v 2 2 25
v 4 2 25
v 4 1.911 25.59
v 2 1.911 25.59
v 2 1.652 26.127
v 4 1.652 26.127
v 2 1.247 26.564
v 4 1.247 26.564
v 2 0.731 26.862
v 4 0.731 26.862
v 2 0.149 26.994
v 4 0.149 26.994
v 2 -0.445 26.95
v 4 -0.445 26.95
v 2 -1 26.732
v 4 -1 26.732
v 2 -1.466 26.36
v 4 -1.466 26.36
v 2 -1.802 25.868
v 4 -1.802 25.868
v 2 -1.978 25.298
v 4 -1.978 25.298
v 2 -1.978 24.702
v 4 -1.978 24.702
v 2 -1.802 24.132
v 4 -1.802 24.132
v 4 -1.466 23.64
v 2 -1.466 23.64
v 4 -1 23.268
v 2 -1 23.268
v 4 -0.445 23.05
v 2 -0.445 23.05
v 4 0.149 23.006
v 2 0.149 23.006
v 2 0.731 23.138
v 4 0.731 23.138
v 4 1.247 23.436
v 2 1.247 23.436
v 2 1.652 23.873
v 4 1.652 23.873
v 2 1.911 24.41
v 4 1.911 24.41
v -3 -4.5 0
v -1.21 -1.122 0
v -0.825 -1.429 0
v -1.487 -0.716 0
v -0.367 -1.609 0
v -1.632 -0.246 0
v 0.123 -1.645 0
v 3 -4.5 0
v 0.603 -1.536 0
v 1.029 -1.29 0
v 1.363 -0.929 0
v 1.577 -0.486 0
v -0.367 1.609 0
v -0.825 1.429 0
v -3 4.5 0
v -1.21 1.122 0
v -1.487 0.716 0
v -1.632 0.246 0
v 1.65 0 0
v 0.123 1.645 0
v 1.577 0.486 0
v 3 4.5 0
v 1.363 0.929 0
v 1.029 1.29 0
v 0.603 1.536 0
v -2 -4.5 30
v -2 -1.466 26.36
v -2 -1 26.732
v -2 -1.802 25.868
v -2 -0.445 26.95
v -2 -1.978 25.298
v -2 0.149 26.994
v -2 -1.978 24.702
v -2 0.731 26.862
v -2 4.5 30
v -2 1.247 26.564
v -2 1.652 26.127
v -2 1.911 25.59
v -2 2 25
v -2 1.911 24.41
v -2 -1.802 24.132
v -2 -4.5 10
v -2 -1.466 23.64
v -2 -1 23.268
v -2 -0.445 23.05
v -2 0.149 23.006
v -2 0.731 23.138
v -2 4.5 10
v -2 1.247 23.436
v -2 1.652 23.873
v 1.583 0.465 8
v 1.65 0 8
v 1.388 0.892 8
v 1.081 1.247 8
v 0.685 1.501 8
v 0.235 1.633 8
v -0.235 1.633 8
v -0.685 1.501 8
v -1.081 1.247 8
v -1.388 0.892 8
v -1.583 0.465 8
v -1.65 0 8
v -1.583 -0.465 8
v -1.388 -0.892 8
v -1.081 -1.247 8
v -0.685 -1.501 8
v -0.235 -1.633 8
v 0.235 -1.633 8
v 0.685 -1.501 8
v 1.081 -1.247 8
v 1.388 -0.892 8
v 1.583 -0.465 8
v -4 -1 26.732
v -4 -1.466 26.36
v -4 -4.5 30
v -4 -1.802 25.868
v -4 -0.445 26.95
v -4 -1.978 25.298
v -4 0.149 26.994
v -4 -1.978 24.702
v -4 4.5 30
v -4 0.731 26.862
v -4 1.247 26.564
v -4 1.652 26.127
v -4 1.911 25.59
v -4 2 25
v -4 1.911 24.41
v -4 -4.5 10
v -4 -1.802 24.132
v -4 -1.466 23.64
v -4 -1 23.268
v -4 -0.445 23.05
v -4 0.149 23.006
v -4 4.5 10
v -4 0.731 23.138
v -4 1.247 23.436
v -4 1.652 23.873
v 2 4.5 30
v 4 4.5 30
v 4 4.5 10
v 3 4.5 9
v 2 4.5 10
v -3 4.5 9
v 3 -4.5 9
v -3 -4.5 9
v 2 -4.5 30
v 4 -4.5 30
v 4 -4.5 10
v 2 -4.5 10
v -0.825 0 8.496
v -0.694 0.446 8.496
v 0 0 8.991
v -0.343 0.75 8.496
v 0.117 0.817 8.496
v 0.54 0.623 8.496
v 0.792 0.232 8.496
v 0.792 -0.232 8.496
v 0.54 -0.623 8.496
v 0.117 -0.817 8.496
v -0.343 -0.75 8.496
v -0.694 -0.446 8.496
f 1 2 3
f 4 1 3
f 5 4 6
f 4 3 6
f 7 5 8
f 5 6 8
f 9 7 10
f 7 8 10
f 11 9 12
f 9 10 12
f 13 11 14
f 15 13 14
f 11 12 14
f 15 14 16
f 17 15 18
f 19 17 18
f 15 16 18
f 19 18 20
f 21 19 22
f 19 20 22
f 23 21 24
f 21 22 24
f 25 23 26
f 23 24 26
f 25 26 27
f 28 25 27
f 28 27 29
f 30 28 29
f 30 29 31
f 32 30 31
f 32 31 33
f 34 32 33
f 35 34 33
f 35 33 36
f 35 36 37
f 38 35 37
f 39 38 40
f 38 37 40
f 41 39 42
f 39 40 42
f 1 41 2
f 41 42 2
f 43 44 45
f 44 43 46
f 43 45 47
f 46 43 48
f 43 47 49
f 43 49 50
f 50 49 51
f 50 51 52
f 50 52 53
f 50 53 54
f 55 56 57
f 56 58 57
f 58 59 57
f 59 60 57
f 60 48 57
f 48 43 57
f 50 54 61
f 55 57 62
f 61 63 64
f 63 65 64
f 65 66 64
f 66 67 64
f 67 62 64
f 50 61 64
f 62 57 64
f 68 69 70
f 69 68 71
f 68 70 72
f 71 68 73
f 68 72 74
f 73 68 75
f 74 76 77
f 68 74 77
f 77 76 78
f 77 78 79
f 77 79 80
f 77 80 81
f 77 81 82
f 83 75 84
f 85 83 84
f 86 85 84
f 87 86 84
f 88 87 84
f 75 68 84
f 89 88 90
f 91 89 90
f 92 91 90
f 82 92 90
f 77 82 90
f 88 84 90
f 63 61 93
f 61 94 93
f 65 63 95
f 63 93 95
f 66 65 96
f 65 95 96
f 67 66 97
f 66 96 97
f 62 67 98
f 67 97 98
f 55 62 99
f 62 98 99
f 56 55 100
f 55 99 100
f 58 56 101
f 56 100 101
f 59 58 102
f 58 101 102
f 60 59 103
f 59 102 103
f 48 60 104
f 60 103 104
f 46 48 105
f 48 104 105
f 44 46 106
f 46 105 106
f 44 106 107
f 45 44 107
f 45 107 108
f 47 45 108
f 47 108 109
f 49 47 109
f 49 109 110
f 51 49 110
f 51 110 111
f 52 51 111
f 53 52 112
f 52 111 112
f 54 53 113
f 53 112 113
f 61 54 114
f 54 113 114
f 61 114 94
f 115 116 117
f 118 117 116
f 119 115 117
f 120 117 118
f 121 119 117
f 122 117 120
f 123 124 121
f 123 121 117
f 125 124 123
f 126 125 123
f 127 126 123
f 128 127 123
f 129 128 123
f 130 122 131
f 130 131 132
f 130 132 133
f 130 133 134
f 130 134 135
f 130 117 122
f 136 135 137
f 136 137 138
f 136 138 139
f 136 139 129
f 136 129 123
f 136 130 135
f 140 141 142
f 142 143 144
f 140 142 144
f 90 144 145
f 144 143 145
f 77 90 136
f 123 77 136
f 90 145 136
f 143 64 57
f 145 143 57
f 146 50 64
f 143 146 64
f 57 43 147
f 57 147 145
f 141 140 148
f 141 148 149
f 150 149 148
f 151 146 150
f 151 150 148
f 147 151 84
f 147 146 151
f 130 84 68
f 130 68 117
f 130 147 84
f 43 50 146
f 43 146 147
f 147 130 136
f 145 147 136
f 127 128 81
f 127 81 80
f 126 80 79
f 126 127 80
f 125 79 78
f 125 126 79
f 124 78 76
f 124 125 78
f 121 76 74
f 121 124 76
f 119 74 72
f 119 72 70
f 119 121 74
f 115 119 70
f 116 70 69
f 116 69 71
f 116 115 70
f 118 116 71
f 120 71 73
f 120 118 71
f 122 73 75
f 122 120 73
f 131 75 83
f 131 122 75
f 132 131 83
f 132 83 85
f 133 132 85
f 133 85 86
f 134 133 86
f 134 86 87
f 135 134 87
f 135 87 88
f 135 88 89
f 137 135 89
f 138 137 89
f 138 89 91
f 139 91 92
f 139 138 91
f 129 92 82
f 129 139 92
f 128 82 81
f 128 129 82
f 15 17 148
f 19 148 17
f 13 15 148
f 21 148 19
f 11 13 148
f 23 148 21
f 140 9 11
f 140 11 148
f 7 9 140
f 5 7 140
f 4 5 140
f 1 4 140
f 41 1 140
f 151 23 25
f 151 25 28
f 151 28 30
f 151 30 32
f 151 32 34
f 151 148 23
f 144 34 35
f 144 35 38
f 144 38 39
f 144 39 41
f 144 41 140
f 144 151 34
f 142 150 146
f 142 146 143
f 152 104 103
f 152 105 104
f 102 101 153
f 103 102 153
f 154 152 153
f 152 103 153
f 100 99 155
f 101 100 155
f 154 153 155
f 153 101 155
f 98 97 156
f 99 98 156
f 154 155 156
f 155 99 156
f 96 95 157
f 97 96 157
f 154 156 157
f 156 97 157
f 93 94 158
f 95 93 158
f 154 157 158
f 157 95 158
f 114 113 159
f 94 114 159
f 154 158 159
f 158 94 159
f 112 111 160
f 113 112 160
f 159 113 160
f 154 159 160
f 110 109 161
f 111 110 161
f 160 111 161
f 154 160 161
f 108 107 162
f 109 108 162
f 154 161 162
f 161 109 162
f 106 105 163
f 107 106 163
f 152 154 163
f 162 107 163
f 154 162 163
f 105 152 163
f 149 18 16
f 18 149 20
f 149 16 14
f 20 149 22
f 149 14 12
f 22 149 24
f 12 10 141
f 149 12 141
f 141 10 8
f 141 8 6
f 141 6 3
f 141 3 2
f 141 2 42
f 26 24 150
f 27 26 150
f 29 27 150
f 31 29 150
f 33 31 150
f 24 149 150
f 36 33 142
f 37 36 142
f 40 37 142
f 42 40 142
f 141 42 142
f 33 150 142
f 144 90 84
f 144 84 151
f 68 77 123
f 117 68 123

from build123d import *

# Parameters (mm, degrees)
SKETCH1_W             = 6
SKETCH1_H             = 9
BOSS_EXTRUDE1_DEPTH   = 10
M4_TAPPED_HOLE2_D     = 3.3
M4_TAPPED_HOLE2_DEPTH = 8
M4_TAPPED_HOLE2_TIP   = 0.991420021
SKETCH11_W            = 2
SKETCH11_H            = 9
BOSS_EXTRUDE5_DEPTH   = 20
SKETCH12_R            = 2
CUT_EXTRUDE1_DEPTH    = 2
CHAMFER1_SIZE         = 1
CHAMFER2_SIZE         = 1


with BuildPart() as part:
    # Sketch1 → Boss-Extrude1 (new body)
    with BuildSketch(Plane.XY):
        Rectangle(SKETCH1_W, SKETCH1_H)
    extrude(amount=BOSS_EXTRUDE1_DEPTH)

    # M4 Tapped Hole2
    with Locations(Plane(origin=(0, 0, 0), x_dir=(-1, 0, 0), z_dir=(0, 0, -1))):
        with Locations((0, 0)):
            Hole(M4_TAPPED_HOLE2_D / 2, depth=M4_TAPPED_HOLE2_DEPTH)
            with Locations((0, 0, -(M4_TAPPED_HOLE2_DEPTH + M4_TAPPED_HOLE2_TIP / 2))):  # 118° drill point
                Cone(0, M4_TAPPED_HOLE2_D / 2, M4_TAPPED_HOLE2_TIP, mode=Mode.SUBTRACT)

    # Sketch11 → Boss-Extrude5 (add)
    with BuildSketch(Plane.XY.offset(10)):
        with Locations((3, 0)):
            Rectangle(SKETCH11_W, SKETCH11_H)
    boss_extrude5 = extrude(amount=BOSS_EXTRUDE5_DEPTH)

    # Sketch12 → Cut-Extrude1 (cut)
    with BuildSketch(Plane(origin=(4, 0, 0), x_dir=(0, 0, -1), z_dir=(1, 0, 0))):
        with Locations(Location((-25, 0, 0), (0, 0, 90))):
            Circle(SKETCH12_R)
    cut_extrude1 = extrude(amount=-CUT_EXTRUDE1_DEPTH, mode=Mode.SUBTRACT)

    # Mirror1: Boss-Extrude5, Cut-Extrude1 across plane
    add(boss_extrude5.mirror(Plane(origin=(0, 0, 0), x_dir=(0, 0, 1), z_dir=(1, 0, 0))))
    add(cut_extrude1.mirror(Plane(origin=(0, 0, 0), x_dir=(0, 0, 1), z_dir=(1, 0, 0))), mode=Mode.SUBTRACT)

    # Chamfer1
    chamfer1_edges = [part.edges().sort_by_distance(p)[0] for p in [
        (3, 0, 10),
    ]]
    chamfer(chamfer1_edges, length=CHAMFER1_SIZE - 0.0001)  # a hair under: the kernel refuses the full size

    # Chamfer2
    chamfer2_edges = [part.edges().sort_by_distance(p)[0] for p in [
        (-3, 0, 10),
    ]]
    chamfer(chamfer2_edges, length=CHAMFER2_SIZE - 0.0001)  # a hair under: the kernel refuses the full size


solid = part.part
